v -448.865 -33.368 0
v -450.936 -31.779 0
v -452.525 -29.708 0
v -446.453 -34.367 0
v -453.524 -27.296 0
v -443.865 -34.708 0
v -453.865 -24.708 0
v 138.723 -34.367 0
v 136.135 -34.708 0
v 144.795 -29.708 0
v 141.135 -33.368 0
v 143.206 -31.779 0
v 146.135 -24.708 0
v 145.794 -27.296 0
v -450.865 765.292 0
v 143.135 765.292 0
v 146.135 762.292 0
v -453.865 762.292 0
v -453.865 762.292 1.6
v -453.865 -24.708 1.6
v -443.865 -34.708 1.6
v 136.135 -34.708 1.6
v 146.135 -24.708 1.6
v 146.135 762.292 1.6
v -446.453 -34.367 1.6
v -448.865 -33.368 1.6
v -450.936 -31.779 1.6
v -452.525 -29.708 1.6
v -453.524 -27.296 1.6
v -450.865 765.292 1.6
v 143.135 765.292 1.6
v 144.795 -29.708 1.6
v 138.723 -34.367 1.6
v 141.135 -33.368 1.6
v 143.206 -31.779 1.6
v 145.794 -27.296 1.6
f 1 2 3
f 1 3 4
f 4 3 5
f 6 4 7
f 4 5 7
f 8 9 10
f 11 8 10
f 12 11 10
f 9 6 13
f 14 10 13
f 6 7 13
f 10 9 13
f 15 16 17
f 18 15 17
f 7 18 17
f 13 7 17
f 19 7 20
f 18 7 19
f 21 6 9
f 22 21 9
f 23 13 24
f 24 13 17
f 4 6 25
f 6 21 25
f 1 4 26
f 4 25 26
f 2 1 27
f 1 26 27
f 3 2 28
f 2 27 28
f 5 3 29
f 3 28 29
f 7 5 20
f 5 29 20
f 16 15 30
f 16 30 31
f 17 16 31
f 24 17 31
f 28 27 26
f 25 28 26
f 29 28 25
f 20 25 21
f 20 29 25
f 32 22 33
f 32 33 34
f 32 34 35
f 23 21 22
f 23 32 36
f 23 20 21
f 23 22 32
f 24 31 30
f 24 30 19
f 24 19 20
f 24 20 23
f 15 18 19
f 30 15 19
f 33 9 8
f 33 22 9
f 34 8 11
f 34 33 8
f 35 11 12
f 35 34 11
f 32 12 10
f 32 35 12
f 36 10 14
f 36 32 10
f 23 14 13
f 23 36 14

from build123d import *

# Parameters (mm, degrees)
F0_W     = 600
F0_H     = 800
F1_DEPTH = 1.6
F2_R     = 10
F3_R     = 10
F4_SIZE  = 3
F5_SIZE  = 3


with BuildPart() as f1:
    # F0 (on Top) → F1 (new body)
    with BuildSketch(Plane.XY):
        with Locations((-153.864802, 365.292372)):
            Rectangle(F0_W, F0_H)
    extrude(amount=F1_DEPTH)

    # F2
    f2_edges = [f1.edges().sort_by_distance(p)[0] for p in [
        (146.135198, -34.707628, 0.8),
    ]]
    fillet(f2_edges, radius=F2_R)

    # F3
    f3_edges = [f1.edges().sort_by_distance(p)[0] for p in [
        (-453.864802, -34.707628, 0.8),
    ]]
    fillet(f3_edges, radius=F3_R)

    # F4
    f4_edges = [f1.edges().sort_by_distance(p)[0] for p in [
        (146.135198, 765.292372, 0.8),
    ]]
    chamfer(f4_edges, length=F4_SIZE)

    # F5
    f5_edges = [f1.edges().sort_by_distance(p)[0] for p in [
        (-453.864802, 765.292372, 0.8),
    ]]
    chamfer(f5_edges, length=F5_SIZE)


solid = f1.part
